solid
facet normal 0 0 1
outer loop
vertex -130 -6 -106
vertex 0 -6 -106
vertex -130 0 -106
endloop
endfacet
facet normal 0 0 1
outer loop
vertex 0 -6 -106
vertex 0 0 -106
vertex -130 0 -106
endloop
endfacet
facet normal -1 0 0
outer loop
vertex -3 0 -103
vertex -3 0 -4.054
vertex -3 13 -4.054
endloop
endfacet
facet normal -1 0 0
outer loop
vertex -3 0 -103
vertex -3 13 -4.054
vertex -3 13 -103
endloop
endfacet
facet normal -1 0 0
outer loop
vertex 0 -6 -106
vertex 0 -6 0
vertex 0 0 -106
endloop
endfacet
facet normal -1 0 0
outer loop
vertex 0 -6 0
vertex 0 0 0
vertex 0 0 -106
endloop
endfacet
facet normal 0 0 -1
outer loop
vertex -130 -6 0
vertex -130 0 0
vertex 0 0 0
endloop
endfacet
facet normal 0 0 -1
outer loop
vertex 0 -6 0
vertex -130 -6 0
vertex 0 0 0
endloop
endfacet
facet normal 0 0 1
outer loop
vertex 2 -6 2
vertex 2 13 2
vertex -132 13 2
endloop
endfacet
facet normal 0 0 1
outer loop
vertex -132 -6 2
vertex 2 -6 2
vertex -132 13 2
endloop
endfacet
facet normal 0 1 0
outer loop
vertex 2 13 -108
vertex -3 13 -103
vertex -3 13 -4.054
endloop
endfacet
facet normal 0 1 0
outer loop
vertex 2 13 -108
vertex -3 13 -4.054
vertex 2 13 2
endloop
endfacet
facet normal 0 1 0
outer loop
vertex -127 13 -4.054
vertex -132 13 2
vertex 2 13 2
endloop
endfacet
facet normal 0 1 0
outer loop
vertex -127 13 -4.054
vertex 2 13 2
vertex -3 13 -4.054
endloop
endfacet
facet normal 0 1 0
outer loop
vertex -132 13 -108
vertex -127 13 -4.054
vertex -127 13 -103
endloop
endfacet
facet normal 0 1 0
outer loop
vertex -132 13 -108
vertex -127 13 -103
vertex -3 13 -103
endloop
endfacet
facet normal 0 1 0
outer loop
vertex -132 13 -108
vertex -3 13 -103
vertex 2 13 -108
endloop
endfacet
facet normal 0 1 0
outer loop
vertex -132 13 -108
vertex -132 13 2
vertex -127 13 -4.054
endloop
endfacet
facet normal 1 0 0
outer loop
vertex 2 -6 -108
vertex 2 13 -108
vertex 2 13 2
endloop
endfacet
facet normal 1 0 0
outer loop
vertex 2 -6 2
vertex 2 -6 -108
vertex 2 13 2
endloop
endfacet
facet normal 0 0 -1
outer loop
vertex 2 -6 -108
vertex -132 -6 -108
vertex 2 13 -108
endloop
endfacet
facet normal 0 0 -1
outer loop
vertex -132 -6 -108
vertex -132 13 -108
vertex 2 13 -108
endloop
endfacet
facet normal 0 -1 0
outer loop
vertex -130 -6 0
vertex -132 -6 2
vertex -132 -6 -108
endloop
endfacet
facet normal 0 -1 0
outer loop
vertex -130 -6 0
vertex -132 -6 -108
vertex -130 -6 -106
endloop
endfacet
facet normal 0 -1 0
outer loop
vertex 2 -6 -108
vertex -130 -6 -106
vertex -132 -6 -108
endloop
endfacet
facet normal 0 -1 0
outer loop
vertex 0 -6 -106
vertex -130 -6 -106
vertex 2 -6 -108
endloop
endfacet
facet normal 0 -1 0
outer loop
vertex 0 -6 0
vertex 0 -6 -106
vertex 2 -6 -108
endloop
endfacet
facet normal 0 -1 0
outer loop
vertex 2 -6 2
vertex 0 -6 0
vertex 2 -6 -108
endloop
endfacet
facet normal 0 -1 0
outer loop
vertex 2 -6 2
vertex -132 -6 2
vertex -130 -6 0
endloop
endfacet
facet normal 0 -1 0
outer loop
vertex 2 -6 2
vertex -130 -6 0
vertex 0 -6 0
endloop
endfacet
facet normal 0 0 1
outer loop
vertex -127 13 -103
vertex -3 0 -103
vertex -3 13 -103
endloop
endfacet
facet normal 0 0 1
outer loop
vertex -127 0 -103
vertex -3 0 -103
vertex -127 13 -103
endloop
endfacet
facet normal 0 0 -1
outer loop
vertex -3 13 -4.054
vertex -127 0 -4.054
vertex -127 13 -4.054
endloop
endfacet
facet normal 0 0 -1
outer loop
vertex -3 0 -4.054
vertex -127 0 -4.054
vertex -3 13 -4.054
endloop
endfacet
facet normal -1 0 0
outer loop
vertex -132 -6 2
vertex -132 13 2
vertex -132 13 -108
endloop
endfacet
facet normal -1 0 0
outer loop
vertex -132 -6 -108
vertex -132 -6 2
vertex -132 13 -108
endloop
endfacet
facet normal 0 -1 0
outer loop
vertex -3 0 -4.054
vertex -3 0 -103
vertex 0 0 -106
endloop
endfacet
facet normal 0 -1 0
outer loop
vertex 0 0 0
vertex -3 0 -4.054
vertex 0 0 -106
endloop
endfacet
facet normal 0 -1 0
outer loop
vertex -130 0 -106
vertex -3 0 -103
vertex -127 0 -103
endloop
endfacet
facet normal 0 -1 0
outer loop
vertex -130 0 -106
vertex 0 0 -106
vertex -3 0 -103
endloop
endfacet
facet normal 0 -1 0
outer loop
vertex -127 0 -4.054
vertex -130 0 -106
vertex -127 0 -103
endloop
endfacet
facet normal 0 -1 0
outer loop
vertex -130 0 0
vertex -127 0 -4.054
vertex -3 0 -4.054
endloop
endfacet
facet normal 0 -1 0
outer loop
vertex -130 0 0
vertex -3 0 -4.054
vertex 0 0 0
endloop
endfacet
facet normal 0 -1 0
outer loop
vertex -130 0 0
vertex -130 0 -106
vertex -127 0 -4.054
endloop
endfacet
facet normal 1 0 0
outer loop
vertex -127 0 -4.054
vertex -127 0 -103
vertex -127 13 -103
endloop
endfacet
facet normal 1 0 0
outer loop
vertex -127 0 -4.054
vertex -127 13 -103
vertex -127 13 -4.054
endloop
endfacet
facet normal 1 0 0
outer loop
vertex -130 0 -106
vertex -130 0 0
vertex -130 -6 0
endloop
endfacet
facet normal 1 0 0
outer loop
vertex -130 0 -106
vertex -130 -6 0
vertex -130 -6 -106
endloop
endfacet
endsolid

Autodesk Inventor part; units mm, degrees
ref_plane "YZ Plane" through (0, 0, 0) normal (1, 0, 0) x (0, 1, 0)
ref_plane "XZ Plane" through (0, 0, 0) normal (0, 1, 0) x (-1, 0, 0)
ref_plane "XY Plane" through (0, 0, 0) normal (0, 0, 1) x (1, 0, 0)
sketch "Sketch1" plane through (0, 0, 0) normal (0, 1, 0) x (-1, 0, 0)
  line L0 (0, 0) -> (130, 0)
  line L1 (130, 0) -> (130, -106)
  line L2 (130, -106) -> (0, -106)
  line L3 (0, -106) -> (0, 0)
  line L4 (130, 0) -> (130, -3)
  line L5 (127, -4.0545) -> (0, -4.0545)
  line L6 (0, -4.0545) -> (3, -4.0545)
  line L7 (3, -4.0545) -> (3, -106)
  line L8 (3, -106) -> (3, -103)
  line L9 (3, -103) -> (3, -101.9174)
  line L10 (3, -103) -> (130, -103)
  line L11 (130, -3) -> (127, -4.0545)
  line L12 (130, -103) -> (127, -103)
  line L13 (127, -103) -> (127, -4.0545)
  line L14 (127, -4.0545) -> (0, -4.0545)
  line L15 (0, 0) -> (0, -106)
  line L16 (0, -106) -> (130, -106)
  line L17 (130, -106) -> (130, 0)
  line L18 (127, -4.0545) -> (127, -103)
  line L19 (127, -103) -> (3, -103)
  line L20 (3, -103) -> (3, -4.0545)
  line L21 (3, -4.0545) -> (127, -4.0545)
  dimension "d0" = 130
  dimension "d1" = 106
  dimension "d2" = 3
  dimension "d3" = 3
  dimension "d4" = 3
  dimension "d5" = 3
sketch "Sketch2" plane through (0, 0, 0) normal (0, 1, 0) x (-1, 0, 0)
  point P0 (0, 0)
extrude "Extrusion1" add sketch "Sketch1" along normal blind 13 contours L0 L1 L11 L5 L3 | L5 L7 L2 L3 | L1 L10 L13 L11 | L1 L2 L7 L10
sketch "Sketch6" plane through (-130, 0, 0) normal (0, 0, 1) x (1, 0, 0)
  line L0 (0, 13) -> (130, 13) projected
  line L1 (0, 13) -> (130, 13)
  line L2 (130, 13) -> (130, 0)
  line L3 (130, 0) -> (0, 0)
  line L4 (0, 0) -> (0, 13)
extrude "Extrusion3" add sketch "Sketch6" along normal blind 2
sketch "Sketch7" plane through (0, 0, 0) normal (0, -1, 0) x (1, 0, 0)
  line L0 (-130, -106) -> (-130, 2) projected
  line L1 (-130, 0) -> (0, 0)
  line L2 (0, -106) -> (0, 2) projected
  line L3 (0, 0) -> (0, 2)
  line L4 (0, 2) -> (-130, 2)
  line L5 (-130, 2) -> (-130, 0)
  point P0 (-130, 2)
extrude "Extrusion4" add sketch "Sketch7" along normal blind 4
sketch "Sketch8" plane through (-130, 0, -106) normal (-1, 0, 0) x (0, 0, 1)
  line L0 (108, 13) -> (108, -4) projected
  line L1 (0, 0) -> (106, 0) projected
  line L2 (108, 13) -> (0, 13)
  line L3 (0, 13) -> (0, 0)
  line L4 (0, 0) -> (108, 0)
  line L5 (108, 0) -> (108, 13)
extrude "Extrusion5" add sketch "Sketch8" along normal blind 2
sketch "Sketch9" plane through (0, 0, 0) normal (0, -1, 0) x (1, 0, 0)
  line L0 (0, -106) -> (-132, -106) projected
  line L1 (-132, -106) -> (-130, -106)
  line L2 (-130, -106) -> (-130, 2.3053)
  line L3 (-127, -4.0545) -> (-127, -103) projected
  line L4 (-130, 2.3053) -> (-132, 2.3053)
  line L5 (-132, -106) -> (-132, 2) projected
  line L6 (-132, 2.3053) -> (-132, -106)
  point P0 (0, 0)
  dimension "d20" = 2
extrude "Extrusion6" add sketch "Sketch9" along normal blind 4
sketch "Sketch10" plane through (-132, 0, -106) normal (-1, 0, 0) x (0, 0, 1)
  line L0 (108, 13) -> (108, -4) projected
  line L1 (108, 0) -> (108, -4)
  line L2 (108, -4) -> (108.3053, -4) projected
  line L3 (108.3053, 0) -> (108.3053, -4) projected
  line L4 (108.3053, -4) -> (108.3053, 0)
  line L5 (108, 0) -> (108.3053, 0)
  line L6 (108.3053, 0) -> (108.3053, -4)
  line L7 (108.3053, -4) -> (108, -4)
  point P0 (106, 0)
extrude "Extrusion7" cut sketch "Sketch10" against normal blind 4
sketch "Sketch11" plane through (0, 0, -106) normal (0, 0, -1) x (-1, 0, 0)
  line L0 (0, 13) -> (132, 13) projected
  line L1 (132, 13) -> (0, 13)
  line L2 (0, 13) -> (0, 0)
  line L3 (0, 0) -> (132, 0)
  line L4 (132, 0) -> (132, 13)
extrude "Extrusion8" add sketch "Sketch11" along normal blind 2
sketch "Sketch12" plane through (0, 0, 0) normal (0, -1, 0) x (1, 0, 0)
  line L0 (-132, 2) -> (-132, -106) projected
  line L1 (0, -108) -> (-132, -108) projected
  line L2 (-132, -106) -> (0, -106)
  line L3 (0, -106) -> (0, -108)
  line L4 (0, -108) -> (-132, -108)
  line L5 (-132, -108) -> (-132, -106)
  point P0 (0, 0)
extrude "Extrusion9" add sketch "Sketch12" along normal blind 4
sketch "Sketch13" plane through (0, -4, 2) normal (1, 0, 0) x (0, 0, -1)
  line L0 (0, 17) -> (0, 0) projected
  line L1 (110.1979, 4) -> (0, 4)
  line L2 (0, 4) -> (0, 17)
  line L3 (0, 17) -> (110.1979, 17)
  line L4 (110.1979, 17) -> (110.1979, 4)
  point P0 (2, 4)
  point P1 (0, 4)
extrude "Extrusion10" add sketch "Sketch13" along normal blind 2
sketch "Sketch14" plane through (0, 0, 0) normal (0, -1, 0) x (1, 0, 0)
  line L0 (-132, -108) -> (0, -108) projected
  line L1 (2, 2) -> (2, -108.1979) projected
  line L2 (0, -108) -> (2, -108)
  line L3 (2, -108) -> (2, 2)
  line L4 (2, 2) -> (0, 2)
  line L5 (0, 2) -> (0, -108)
  point P0 (0, 0)
extrude "Extrusion11" add sketch "Sketch14" along normal blind 4
sketch "Sketch15" plane through (0, 0, 0) normal (0, -1, 0) x (1, 0, 0)
  line L0 (2, -108) -> (2, -108.1979) projected
  line L1 (2, -108.1979) -> (0, -108.1979)
  line L2 (0, -108.1979) -> (0, -108)
  line L3 (0, -108) -> (2, -108)
  line L4 (2, -108) -> (2, -108.1979)
  point P0 (0, 0)
extrude "Extrusion12" cut sketch "Sketch15" against normal blind 15
sketch "Sketch16" plane through (0, 0, -108) normal (0, 0, -1) x (-1, 0, 0)
  point P0 (0, 0)
sketch "Sketch17" plane through (0, -4, 0) normal (0, -1, 0) x (1, 0, 0)
  line L0 (2, 2) -> (-132, 2)
  line L1 (-132, 2) -> (-132, -108)
  line L2 (-132, -108) -> (2, -108)
  line L3 (2, -108) -> (2, 2)
  line L4 (0, -106) -> (-130, -106) projected
  line L5 (-130, 0) -> (-130, -106) projected
  line L6 (-130, -106) -> (-130, 0)
  line L7 (-130, 0) -> (0, 0)
  line L8 (0, 0) -> (0, -106)
  line L9 (0, -106) -> (-130, -106)
extrude "Extrusion13" add sketch "Sketch17" along normal blind 2
properties part number "che"
